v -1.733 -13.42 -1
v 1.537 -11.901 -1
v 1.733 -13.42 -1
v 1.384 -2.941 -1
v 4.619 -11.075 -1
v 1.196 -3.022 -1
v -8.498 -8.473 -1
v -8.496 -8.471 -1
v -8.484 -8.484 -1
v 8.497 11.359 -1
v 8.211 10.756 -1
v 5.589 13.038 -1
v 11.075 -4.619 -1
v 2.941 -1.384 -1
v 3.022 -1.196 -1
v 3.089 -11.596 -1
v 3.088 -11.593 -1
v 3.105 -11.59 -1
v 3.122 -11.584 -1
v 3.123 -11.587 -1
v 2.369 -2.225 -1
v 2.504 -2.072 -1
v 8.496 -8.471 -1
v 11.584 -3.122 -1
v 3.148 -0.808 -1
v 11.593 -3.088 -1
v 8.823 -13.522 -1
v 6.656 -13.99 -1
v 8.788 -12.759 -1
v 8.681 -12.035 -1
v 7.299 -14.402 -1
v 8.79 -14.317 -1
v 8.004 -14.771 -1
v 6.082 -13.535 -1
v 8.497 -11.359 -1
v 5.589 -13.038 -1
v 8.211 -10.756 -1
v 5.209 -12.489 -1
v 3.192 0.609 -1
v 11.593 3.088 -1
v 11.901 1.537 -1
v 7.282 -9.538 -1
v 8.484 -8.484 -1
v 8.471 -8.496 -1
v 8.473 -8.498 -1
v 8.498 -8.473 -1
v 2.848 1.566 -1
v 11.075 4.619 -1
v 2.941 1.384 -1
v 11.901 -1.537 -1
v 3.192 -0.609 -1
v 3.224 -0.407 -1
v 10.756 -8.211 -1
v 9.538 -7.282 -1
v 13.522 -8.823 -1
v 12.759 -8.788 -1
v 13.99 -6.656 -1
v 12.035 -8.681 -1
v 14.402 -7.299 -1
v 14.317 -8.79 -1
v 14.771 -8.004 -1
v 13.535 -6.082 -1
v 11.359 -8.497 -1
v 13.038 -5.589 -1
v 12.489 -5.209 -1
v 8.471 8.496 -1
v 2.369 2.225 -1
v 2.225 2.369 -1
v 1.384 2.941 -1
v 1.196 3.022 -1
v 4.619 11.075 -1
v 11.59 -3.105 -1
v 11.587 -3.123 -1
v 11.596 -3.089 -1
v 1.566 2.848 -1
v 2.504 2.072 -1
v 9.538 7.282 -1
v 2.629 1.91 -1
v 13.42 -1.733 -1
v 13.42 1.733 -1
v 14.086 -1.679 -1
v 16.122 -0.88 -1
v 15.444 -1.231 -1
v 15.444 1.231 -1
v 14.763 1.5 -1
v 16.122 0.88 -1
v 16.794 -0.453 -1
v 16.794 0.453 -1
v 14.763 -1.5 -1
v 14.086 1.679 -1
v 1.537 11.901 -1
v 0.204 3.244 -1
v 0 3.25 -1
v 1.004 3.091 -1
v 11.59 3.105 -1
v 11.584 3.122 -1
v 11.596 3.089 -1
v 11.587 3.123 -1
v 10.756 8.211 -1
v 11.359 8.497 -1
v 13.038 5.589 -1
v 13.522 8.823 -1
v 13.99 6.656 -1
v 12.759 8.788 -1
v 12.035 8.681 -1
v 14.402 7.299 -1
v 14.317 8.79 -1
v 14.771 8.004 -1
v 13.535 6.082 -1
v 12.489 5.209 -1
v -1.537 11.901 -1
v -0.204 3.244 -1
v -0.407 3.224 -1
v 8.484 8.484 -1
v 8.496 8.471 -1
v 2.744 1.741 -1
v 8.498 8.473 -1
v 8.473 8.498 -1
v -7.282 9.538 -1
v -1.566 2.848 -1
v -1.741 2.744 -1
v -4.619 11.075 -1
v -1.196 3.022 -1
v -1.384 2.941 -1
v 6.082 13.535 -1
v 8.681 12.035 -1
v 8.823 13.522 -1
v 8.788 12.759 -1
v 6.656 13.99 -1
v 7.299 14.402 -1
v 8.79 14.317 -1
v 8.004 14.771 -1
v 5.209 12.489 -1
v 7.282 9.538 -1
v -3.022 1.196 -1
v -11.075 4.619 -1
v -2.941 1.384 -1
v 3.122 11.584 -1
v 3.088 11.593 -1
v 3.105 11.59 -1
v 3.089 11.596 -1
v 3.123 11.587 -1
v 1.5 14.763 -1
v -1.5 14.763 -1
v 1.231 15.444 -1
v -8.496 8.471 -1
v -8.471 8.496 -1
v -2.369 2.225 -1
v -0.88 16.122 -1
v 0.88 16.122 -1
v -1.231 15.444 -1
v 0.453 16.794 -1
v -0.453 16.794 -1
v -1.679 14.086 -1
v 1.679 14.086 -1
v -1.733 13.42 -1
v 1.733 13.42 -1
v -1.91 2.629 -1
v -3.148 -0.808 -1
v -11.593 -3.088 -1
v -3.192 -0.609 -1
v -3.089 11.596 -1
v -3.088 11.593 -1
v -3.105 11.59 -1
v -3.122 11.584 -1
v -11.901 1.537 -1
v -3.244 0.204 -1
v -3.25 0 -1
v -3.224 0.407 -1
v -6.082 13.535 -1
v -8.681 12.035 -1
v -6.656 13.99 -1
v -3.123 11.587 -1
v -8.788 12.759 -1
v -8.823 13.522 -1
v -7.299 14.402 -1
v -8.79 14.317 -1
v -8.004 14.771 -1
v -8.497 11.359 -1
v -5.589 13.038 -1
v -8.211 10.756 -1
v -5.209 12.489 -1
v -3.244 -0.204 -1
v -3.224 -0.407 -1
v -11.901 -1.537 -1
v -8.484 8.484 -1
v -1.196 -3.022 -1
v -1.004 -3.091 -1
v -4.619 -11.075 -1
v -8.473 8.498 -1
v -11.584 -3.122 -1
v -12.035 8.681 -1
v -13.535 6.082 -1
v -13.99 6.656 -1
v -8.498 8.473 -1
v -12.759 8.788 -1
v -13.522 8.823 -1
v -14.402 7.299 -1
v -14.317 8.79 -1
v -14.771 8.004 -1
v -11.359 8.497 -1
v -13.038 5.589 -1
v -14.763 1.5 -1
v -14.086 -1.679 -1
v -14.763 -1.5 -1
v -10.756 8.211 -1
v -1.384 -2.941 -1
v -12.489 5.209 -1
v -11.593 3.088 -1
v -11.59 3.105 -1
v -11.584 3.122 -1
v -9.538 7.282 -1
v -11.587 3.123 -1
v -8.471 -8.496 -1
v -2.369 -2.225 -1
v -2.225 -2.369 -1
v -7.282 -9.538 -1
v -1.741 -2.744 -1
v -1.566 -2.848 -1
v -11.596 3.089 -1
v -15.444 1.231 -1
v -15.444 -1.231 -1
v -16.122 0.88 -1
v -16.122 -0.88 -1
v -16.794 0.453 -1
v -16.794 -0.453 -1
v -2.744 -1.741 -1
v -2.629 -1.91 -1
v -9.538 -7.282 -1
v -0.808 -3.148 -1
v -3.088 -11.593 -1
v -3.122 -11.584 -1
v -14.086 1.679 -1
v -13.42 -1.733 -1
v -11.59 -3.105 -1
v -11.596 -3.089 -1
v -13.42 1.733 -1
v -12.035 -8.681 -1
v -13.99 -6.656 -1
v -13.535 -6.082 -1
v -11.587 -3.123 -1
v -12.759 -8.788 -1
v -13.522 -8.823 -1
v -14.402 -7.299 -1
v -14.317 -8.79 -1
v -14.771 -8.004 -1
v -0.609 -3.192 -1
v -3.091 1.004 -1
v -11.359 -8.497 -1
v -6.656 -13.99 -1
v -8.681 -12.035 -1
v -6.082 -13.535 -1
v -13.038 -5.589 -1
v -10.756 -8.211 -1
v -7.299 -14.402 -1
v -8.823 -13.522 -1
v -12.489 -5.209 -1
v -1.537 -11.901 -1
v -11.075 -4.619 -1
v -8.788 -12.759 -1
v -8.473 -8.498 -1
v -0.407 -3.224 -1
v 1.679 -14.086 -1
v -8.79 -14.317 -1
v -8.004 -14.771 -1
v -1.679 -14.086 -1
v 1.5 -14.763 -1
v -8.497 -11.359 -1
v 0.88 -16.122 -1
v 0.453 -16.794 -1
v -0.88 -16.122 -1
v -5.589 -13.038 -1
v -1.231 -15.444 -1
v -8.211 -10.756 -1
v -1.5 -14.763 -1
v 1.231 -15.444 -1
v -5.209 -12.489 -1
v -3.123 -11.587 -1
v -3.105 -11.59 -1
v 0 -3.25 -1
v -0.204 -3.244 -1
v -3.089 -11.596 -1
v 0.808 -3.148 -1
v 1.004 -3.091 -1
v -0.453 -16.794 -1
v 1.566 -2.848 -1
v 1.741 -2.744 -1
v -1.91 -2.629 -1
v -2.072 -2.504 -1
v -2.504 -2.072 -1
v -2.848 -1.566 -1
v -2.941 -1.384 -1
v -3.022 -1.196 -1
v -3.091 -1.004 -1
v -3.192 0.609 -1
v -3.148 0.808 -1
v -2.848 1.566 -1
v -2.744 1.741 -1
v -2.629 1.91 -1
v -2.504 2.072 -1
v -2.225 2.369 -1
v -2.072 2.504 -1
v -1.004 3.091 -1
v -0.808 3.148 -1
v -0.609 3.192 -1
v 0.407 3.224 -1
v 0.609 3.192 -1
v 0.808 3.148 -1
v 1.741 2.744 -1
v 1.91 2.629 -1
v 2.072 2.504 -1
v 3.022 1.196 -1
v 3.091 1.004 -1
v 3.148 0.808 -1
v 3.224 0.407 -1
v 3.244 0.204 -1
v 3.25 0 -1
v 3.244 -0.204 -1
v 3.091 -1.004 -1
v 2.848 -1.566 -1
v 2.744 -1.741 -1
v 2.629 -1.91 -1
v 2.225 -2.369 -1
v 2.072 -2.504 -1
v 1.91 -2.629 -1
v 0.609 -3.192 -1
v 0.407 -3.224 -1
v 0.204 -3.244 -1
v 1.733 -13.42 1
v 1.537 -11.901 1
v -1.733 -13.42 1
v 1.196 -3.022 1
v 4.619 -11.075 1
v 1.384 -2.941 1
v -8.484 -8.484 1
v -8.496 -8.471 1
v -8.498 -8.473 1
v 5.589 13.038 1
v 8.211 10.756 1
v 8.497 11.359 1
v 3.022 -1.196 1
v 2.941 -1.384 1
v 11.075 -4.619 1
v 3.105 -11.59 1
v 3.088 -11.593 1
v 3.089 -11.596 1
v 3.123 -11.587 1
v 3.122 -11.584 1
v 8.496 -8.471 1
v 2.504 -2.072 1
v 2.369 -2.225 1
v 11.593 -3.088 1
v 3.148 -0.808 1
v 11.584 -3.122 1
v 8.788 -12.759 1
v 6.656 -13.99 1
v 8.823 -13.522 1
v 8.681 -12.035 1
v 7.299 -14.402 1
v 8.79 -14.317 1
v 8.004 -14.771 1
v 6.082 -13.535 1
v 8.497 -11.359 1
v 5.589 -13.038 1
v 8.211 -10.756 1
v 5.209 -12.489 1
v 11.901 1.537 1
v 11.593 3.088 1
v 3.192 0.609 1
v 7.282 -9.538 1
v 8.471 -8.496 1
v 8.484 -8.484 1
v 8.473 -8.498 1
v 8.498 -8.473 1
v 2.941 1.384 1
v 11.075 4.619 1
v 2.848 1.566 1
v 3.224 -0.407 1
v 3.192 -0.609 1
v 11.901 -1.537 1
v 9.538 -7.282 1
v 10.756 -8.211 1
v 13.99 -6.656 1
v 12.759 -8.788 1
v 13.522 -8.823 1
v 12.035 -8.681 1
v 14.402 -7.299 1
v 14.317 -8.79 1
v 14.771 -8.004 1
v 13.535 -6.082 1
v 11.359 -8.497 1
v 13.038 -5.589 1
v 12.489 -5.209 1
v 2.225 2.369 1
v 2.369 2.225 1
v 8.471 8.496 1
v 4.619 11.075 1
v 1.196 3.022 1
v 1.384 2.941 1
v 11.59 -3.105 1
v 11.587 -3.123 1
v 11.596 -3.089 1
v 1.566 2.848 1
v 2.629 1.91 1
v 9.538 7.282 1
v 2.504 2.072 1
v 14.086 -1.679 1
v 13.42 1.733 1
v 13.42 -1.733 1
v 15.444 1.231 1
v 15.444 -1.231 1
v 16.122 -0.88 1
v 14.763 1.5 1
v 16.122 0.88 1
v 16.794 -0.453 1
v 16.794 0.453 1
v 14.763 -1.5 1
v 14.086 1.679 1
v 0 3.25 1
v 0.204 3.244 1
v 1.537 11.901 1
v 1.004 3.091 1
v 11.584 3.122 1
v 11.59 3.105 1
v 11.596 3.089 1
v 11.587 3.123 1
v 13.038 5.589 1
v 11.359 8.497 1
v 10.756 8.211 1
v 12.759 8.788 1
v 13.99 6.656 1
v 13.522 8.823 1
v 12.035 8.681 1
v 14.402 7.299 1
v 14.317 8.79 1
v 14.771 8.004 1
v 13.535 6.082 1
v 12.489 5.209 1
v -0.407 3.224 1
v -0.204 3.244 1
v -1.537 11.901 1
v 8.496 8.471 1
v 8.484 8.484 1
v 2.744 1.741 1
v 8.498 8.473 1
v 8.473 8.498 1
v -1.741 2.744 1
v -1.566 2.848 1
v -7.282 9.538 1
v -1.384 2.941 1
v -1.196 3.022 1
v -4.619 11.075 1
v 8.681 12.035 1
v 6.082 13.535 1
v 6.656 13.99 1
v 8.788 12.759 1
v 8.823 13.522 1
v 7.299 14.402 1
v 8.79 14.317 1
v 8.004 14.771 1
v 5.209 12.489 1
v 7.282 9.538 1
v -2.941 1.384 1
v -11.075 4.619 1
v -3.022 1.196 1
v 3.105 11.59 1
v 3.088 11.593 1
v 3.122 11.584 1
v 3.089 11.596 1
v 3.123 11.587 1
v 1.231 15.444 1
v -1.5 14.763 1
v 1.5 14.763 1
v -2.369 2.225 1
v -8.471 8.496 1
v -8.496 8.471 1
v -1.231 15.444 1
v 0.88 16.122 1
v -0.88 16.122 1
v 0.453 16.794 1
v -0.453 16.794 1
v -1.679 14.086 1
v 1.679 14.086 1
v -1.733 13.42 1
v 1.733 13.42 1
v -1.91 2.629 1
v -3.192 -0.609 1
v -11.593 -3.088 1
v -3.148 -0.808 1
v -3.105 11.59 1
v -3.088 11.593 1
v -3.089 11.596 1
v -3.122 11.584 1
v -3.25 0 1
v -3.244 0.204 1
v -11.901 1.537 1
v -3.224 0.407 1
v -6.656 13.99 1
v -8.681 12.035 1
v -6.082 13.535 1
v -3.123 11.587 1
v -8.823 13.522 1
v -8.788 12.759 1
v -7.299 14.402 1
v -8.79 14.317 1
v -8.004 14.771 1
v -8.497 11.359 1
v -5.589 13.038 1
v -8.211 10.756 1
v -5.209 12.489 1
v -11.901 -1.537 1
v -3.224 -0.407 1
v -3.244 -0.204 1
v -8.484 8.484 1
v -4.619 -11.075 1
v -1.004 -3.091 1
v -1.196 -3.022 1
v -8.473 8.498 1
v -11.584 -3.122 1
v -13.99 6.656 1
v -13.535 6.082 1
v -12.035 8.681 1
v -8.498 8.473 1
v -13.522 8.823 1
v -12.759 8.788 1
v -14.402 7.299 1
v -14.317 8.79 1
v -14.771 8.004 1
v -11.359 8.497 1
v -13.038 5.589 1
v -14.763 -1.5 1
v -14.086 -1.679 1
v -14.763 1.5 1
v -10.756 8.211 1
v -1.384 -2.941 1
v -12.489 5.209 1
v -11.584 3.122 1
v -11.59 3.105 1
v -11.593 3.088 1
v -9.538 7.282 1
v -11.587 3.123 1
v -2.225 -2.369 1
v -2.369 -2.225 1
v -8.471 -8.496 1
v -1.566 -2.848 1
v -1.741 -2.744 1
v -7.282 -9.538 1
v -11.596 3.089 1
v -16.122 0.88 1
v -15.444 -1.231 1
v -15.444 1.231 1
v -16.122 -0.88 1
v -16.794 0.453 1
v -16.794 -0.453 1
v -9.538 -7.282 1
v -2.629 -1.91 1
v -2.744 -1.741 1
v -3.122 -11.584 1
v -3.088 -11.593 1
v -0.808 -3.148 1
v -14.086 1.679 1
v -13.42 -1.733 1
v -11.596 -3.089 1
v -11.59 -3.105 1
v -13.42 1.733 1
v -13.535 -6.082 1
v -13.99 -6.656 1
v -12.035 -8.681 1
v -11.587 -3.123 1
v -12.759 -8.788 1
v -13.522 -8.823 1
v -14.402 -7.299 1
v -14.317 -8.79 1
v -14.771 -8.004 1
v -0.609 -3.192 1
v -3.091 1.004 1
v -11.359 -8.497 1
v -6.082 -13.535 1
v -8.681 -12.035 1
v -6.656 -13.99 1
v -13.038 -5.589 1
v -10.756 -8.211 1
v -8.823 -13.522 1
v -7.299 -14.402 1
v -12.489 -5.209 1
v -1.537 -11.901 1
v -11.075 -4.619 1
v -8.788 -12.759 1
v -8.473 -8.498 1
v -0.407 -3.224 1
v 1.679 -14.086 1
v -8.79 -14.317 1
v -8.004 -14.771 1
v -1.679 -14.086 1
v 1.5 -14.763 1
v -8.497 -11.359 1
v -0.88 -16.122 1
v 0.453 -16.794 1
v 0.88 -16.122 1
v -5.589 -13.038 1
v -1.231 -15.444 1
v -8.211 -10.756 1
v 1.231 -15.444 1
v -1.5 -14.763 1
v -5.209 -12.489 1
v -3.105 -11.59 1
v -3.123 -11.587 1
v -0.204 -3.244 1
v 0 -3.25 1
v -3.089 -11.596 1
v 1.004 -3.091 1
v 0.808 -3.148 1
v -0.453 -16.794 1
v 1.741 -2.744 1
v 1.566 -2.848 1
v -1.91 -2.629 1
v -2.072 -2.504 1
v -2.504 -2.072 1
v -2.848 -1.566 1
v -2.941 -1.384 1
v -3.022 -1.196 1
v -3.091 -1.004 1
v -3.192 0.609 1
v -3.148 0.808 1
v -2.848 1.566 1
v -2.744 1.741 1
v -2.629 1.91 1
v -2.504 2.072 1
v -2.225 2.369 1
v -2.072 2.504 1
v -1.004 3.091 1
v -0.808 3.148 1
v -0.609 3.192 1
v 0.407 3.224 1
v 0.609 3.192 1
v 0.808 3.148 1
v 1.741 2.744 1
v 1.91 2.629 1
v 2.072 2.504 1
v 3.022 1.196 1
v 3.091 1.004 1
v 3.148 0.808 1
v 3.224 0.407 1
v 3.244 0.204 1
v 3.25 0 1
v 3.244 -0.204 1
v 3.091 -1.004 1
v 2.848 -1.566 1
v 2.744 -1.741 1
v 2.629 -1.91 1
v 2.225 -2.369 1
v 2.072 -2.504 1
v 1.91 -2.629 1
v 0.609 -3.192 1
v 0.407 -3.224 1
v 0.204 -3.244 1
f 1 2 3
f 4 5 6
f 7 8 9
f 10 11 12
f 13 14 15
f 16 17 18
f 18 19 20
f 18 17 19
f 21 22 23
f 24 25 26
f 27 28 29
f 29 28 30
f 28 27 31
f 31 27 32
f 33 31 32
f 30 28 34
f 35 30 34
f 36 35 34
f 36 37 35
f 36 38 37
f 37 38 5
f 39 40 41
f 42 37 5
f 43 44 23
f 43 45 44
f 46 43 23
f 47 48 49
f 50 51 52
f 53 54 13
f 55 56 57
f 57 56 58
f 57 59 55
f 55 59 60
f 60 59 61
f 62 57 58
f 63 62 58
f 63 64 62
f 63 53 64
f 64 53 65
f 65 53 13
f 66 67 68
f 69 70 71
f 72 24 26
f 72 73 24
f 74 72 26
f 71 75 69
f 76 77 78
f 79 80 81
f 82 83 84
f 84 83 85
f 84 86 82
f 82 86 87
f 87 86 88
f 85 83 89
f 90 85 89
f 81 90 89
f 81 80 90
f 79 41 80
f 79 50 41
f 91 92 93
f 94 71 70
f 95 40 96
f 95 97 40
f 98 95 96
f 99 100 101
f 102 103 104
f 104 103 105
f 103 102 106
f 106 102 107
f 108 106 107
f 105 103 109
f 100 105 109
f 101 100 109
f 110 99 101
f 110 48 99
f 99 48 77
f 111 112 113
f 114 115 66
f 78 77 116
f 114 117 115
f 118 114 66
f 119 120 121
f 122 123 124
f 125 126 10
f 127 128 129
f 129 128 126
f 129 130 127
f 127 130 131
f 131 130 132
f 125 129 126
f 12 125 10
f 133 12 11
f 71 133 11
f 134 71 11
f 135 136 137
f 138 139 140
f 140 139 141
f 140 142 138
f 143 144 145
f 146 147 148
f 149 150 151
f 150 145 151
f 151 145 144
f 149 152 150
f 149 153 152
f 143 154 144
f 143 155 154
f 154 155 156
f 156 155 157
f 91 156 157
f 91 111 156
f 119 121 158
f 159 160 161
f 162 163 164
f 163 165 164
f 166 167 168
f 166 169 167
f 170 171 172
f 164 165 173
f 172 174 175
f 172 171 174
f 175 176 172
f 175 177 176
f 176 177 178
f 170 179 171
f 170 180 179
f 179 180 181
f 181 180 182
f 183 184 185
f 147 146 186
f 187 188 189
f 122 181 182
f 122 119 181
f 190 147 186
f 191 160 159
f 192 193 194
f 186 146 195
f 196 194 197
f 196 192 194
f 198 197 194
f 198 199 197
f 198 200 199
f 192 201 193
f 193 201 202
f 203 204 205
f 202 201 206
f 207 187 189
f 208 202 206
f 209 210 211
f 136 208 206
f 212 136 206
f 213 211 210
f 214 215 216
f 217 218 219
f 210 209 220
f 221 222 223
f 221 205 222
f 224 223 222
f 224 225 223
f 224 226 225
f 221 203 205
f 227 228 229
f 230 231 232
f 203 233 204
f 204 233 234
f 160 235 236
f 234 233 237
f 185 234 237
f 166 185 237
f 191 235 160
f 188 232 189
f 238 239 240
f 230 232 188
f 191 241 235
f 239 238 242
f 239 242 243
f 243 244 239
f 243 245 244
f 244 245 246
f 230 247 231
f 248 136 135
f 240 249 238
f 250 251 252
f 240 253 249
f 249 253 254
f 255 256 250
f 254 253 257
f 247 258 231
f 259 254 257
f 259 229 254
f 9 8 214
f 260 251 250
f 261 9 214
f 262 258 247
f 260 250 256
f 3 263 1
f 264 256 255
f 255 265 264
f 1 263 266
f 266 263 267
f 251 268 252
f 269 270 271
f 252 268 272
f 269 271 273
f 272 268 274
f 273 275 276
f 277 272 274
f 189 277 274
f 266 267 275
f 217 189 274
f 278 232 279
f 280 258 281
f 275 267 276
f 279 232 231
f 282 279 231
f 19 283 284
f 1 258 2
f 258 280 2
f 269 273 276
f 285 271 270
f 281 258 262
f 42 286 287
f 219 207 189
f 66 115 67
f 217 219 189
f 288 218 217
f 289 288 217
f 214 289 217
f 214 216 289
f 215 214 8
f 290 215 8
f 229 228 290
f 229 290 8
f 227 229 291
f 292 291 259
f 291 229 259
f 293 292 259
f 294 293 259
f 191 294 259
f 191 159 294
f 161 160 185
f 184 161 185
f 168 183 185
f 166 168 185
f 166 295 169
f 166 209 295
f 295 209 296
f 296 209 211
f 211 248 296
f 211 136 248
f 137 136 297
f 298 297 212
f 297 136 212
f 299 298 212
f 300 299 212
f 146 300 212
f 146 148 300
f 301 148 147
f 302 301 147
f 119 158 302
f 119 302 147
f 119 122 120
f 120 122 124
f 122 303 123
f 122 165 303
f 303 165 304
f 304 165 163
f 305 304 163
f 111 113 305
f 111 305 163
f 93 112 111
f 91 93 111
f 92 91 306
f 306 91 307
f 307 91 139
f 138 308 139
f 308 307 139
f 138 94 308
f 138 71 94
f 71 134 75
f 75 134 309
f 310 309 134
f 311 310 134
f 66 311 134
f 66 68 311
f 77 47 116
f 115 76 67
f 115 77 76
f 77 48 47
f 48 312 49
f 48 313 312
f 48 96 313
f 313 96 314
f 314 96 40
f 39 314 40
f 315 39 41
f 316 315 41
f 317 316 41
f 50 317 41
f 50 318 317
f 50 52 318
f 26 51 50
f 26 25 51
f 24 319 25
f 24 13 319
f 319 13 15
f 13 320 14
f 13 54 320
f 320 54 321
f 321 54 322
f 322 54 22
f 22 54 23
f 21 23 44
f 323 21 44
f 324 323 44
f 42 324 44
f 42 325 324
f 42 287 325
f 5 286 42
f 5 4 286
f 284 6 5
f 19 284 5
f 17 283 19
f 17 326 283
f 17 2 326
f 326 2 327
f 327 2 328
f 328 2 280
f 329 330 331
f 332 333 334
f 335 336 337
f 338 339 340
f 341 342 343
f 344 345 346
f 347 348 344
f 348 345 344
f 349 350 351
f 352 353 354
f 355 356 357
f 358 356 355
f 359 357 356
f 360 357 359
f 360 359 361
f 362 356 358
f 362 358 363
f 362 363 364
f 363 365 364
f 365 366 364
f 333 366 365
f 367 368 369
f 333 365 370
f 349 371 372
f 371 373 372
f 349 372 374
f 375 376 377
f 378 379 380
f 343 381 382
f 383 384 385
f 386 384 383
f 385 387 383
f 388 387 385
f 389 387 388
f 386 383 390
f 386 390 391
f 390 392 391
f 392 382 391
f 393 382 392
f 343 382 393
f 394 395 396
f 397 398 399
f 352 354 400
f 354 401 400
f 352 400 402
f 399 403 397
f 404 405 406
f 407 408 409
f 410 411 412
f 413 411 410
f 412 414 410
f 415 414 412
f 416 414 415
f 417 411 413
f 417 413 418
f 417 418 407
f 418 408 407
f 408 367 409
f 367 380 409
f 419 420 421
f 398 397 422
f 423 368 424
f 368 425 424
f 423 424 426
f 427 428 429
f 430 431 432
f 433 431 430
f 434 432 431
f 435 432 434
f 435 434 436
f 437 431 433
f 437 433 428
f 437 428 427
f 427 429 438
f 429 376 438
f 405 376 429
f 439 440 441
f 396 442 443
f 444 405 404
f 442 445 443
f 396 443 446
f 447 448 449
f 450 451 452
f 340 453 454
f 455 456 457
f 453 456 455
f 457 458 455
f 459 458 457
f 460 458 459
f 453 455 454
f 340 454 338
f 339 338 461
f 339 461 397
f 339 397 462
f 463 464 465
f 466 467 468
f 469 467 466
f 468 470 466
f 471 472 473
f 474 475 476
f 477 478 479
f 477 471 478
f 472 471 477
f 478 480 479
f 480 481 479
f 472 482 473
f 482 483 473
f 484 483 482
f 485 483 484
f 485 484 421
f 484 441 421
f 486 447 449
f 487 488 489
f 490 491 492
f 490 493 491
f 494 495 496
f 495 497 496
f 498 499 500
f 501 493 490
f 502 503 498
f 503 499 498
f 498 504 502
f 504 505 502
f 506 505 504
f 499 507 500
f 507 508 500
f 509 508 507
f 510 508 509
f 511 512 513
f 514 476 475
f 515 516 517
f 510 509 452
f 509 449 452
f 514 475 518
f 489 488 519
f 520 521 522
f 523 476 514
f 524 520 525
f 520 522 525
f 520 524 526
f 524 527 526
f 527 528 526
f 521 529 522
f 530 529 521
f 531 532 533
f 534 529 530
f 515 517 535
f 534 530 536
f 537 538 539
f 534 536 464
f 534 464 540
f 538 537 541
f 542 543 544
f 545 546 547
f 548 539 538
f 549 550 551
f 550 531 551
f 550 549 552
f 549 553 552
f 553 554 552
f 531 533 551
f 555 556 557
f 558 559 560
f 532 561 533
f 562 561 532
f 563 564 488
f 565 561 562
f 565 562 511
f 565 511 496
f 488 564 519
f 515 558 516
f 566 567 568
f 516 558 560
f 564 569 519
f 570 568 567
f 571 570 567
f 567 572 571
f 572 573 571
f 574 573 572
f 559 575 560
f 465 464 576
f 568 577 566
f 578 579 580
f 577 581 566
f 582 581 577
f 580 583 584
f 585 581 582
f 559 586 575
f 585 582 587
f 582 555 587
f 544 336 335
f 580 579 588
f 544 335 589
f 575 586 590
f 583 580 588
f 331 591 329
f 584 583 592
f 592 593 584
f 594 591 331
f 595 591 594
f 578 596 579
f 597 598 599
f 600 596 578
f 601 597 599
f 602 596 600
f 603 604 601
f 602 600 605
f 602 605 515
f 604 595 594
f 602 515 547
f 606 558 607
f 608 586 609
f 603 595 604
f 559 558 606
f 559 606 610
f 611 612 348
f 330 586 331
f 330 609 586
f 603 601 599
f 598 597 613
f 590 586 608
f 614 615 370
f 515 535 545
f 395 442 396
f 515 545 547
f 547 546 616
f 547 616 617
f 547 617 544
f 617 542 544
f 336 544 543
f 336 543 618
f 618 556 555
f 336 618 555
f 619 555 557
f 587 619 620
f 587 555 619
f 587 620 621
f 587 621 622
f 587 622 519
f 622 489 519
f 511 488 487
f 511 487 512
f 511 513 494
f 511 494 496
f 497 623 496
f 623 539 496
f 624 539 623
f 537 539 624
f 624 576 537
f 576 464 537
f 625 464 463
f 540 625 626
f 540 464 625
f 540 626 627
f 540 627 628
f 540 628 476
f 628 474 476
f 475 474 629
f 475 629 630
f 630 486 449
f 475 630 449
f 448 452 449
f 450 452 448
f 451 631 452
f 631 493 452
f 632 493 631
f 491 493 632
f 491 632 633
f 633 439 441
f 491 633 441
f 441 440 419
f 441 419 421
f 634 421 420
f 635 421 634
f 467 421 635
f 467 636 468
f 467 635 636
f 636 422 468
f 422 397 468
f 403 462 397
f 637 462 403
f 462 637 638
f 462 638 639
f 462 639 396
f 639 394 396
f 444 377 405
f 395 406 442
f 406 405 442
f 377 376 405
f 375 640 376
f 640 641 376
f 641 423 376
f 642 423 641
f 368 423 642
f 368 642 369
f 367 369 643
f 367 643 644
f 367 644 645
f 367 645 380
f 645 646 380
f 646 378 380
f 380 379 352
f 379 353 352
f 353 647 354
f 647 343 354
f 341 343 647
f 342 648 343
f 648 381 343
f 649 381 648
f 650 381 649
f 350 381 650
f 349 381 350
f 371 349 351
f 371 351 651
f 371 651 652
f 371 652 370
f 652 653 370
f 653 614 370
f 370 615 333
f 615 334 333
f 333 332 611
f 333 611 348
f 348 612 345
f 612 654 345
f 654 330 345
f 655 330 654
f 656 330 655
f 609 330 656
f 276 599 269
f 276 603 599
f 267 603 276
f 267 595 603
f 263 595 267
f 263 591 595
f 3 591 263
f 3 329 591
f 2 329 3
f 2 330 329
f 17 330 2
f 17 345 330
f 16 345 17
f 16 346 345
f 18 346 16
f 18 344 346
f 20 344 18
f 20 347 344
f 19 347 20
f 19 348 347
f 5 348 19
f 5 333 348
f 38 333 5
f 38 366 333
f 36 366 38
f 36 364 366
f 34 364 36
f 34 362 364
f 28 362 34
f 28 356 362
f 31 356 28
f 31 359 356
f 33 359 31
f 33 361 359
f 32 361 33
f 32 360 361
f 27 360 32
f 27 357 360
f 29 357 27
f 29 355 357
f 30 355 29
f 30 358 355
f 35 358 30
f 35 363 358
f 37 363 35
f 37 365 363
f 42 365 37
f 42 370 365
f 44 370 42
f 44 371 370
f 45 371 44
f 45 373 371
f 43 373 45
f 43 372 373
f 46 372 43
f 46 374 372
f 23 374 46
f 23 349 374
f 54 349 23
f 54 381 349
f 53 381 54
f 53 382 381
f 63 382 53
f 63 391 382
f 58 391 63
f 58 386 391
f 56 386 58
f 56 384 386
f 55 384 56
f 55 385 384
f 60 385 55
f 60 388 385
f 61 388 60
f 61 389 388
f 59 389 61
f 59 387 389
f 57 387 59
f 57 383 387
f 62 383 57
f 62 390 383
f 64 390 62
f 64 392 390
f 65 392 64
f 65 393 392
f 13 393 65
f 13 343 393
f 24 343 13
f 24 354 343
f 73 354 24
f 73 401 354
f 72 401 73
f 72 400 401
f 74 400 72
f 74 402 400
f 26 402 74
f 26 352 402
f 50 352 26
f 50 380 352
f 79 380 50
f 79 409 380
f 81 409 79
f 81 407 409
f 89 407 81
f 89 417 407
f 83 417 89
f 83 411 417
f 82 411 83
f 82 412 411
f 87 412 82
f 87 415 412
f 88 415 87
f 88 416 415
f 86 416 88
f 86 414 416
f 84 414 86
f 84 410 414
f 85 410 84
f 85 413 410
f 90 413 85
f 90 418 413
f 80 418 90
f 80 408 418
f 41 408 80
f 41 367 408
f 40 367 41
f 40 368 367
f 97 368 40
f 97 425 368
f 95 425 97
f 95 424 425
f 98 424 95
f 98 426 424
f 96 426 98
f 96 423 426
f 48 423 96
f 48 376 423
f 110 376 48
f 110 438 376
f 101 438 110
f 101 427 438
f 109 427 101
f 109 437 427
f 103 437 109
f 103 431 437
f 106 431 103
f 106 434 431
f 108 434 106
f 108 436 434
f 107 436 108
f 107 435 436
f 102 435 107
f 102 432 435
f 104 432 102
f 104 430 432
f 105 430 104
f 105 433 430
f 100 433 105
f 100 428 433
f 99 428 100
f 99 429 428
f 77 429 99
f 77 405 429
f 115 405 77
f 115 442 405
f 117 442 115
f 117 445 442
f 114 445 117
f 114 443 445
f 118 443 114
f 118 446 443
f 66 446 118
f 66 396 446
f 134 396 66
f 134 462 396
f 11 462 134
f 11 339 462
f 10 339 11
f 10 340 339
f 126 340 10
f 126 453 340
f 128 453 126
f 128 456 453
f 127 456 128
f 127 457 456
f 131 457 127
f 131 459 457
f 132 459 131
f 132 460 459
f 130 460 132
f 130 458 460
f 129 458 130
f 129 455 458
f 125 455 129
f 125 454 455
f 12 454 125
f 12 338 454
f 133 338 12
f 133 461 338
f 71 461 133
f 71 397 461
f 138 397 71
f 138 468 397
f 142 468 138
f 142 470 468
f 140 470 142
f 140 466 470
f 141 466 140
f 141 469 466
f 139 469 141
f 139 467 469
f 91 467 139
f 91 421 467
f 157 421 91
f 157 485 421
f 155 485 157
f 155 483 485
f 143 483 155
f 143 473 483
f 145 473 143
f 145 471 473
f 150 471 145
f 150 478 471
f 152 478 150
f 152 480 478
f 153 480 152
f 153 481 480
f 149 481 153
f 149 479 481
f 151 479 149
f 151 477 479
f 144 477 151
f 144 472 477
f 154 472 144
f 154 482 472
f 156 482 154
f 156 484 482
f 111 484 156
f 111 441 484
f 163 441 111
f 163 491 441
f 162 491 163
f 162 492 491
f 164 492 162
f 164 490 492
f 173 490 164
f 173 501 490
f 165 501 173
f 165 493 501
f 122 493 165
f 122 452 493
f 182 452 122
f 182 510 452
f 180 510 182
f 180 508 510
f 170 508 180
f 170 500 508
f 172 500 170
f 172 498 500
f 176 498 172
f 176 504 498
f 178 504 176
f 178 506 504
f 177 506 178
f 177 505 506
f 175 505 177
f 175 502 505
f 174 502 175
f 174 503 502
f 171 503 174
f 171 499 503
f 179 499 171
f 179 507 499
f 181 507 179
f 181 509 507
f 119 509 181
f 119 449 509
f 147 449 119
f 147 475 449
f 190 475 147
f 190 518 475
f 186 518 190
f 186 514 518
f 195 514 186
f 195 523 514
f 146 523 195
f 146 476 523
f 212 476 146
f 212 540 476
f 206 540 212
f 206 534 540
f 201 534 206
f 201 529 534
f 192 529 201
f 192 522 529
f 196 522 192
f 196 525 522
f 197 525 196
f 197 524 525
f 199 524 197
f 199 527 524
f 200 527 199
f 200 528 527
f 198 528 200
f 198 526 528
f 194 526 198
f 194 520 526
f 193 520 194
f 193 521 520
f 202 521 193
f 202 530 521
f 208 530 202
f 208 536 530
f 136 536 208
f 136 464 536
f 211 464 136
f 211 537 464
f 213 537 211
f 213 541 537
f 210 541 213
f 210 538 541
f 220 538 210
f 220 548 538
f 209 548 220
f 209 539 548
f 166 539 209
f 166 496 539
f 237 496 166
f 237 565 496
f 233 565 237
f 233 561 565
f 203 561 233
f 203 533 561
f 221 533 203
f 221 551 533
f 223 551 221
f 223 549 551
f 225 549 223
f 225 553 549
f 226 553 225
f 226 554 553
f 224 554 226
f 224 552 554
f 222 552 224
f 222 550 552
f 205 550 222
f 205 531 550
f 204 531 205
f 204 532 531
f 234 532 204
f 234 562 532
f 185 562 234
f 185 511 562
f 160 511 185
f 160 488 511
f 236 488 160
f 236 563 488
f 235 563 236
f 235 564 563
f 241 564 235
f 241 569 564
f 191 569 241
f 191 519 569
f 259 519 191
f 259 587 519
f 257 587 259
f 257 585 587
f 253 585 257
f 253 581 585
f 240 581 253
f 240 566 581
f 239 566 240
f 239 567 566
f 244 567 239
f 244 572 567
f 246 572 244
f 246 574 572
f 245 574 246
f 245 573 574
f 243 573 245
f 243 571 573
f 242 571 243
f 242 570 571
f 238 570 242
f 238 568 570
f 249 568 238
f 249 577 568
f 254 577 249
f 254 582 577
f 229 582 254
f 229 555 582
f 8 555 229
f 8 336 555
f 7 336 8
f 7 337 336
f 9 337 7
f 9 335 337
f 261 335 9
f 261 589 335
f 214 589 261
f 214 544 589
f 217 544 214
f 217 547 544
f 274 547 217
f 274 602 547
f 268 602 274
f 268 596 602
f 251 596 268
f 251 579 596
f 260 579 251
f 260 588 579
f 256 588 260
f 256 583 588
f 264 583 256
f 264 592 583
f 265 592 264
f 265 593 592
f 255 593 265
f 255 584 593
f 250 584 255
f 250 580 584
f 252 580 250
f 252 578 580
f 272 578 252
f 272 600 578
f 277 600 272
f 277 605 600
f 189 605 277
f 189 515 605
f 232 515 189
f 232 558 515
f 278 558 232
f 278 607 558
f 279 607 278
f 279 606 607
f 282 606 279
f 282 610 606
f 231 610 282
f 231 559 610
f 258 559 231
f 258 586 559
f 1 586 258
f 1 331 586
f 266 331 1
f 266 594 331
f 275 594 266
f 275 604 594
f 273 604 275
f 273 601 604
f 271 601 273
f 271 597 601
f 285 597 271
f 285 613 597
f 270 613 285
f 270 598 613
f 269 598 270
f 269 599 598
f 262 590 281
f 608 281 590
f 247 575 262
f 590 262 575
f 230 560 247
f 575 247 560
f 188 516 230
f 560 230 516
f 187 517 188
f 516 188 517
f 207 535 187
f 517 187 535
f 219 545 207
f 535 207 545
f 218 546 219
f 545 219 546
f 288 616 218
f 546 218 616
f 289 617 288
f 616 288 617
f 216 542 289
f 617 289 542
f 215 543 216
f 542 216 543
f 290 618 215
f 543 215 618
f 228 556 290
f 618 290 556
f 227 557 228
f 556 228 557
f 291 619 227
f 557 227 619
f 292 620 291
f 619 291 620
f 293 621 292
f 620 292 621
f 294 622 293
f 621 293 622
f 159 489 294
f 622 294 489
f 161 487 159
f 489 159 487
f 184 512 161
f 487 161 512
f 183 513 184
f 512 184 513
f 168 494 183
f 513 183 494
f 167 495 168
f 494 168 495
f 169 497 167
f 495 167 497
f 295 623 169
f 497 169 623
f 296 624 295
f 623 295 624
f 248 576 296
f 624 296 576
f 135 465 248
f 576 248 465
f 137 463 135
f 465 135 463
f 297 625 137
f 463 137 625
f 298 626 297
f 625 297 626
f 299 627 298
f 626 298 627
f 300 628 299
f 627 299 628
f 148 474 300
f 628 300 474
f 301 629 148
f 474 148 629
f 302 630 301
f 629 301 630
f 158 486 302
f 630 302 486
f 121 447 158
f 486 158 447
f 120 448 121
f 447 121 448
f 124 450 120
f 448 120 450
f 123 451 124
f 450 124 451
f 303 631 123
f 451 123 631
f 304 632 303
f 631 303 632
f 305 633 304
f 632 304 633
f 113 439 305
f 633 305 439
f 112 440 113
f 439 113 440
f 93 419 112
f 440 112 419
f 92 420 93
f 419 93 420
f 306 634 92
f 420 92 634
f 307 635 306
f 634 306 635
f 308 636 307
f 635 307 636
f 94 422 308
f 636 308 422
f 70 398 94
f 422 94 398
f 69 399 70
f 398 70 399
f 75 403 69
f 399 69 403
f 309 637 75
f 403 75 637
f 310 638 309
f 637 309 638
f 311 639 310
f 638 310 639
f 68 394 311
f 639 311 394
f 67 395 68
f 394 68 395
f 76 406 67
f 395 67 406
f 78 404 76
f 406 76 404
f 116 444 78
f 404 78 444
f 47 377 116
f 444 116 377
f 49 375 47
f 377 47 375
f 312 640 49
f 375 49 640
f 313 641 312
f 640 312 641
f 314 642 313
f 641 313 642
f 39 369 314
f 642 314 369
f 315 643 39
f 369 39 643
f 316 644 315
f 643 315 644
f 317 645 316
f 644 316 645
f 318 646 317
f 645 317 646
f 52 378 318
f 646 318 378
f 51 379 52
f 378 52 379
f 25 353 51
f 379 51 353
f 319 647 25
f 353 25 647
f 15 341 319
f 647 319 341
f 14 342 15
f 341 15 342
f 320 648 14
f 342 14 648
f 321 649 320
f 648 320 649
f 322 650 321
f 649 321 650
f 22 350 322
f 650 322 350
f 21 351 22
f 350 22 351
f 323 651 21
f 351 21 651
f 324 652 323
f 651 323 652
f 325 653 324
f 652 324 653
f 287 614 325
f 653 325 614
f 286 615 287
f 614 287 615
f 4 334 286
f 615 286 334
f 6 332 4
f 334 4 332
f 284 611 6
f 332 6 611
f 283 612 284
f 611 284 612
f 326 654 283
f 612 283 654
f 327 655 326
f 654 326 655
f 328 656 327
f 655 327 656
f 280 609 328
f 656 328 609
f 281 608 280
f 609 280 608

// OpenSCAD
/**
 * Gear Module
 *
 *
 * This module generates a parametric involute spur gear with customizable pitch
 * radius, number of teeth, pressure angle, backlash, clearance, thickness, and
 * central bore diameter for fitting onto servos or motors.
 *
 * Functions:
 * - polar_to_cartesian(rad, theta): Converts polar coordinates to Cartesian.
 * - involute_angle(b, d): Calculates the involute angle for a given base and current radius.
 * - involute_point(b, s, t, d): Generates an involute curve point for gear tooth geometry.
 * - involute_point_at_fraction(f, r, b, r2, t, s): Interpolates involute point along the tooth.
 * - radius_pitch(circular_pitch, teeth_count): Calculates pitch radius.
 * - outer_radius(r_pitch, circular_pitch, clearance): Computes gear's outer radius.
 * - calc_circular_pitch(r_pitch, teeth_count): Computes circular pitch.
 * - calc_tooth_height(r_pitch, teeth_count, clearance): Computes total tooth height.
 *
 * Module:
 * gear(...)
 *   Creates a 3D involute gear with the specified parameters.
 *
 * Parameters:
 * - r_pitch          : Pitch radius of the gear.
 * - teeth_count      : Number of teeth on the gear.
 * - thickness        : Gear thickness in the Z direction.
 * - servo_dia        : Diameter of the center hole for motor shaft.
 * - teeth_to_hide    : Number of teeth to omit for partial gears.
 * - pressure_angle   : Pressure angle in degrees (typically 20-28 deg).
 * - clearance        : Radial clearance from gear root.
 * - backlash         : Amount of intentional tooth space increase.
 *
 * Example usage:
 *   gear(teeth_count=24, r_pitch=30, backlash=0.5);
 *
 * Notes:
 * - Default gear will render with 12 teeth and 14.4 mm pitch radius.
 * - You can nest modules or geometry inside gear{} to subtract their shape from the final gear.
 * - Set backlash > 0 to ensure intermeshing gears have space for proper mesh fit.
 *
 * Author: Karim Aziiev <karim.aziiev@gmail.com>
 * License: GPL-3.0-or-later
 */

/* Convert a length and polar angle to Cartesian coordinates */
function polar_to_cartesian(rad, theta) = [rad * sin(theta), rad * cos(theta)];

/**
 * Compute the involute angle (in degrees) for a given base radius (b) and
 * current radius (d).
 * The current radius (d) should be greater than or equal to b.
 *
 * Returns the involute angle in degrees.
 */

function involute_angle(b, d) =
  sqrt((d / b) * (d / b) - 1) * (180 / PI) - acos(b / d);

/* Linearly interpolate between max(b, r) and r2 using fraction f,
   and then compute the involute point at that radius.
   f = 0 corresponds to max(b, r) and f = 1 corresponds to r2.
*/
function involute_point_at_fraction(f, r, b, r2, t, s) =
  involute_point(b, s, t, (1 - f) * max(b, r) + f * r2);

/* Compute the involute point (in Cartesian coordinates) for a given base radius (b),
   scaling factor (s), angular offset (t) and the computed radius (d) along the involute.
   In other words, we first compute the involute angle and then compute the Cartesian point.
*/
function involute_point(b, s, t, d) =
  polar_to_cartesian(d, s * (involute_angle(b, d) + t));

function radius_pitch(circular_pitch, teeth_count) =
  circular_pitch * teeth_count / PI / 2;;

function outer_radius(r_pitch, circular_pitch, clearance) =
  r_pitch + circular_pitch / PI - clearance;

function calc_circular_pitch(r_pitch, teeth_count) =
  (r_pitch * 2 * PI) / teeth_count;

function calc_tooth_height(r_pitch, teeth_count, clearance) =
  2 * (calc_circular_pitch(r_pitch, teeth_count) / PI) - clearance;

module gear(r_pitch         = 14.4,
            teeth_count     = 12,
            thickness       = 2,
            servo_dia       = 6.5,
            teeth_to_hide   = 0,
            pressure_angle  = 20,
            clearance       = 0.0,
            backlash        = 0.0) {

  circular_pitch = calc_circular_pitch(r_pitch, teeth_count);

  outer_rad       = outer_radius(r_pitch, circular_pitch, clearance);
  base_circle_rad = r_pitch * cos(pressure_angle);
  root_rad        = r_pitch - (outer_rad - r_pitch) - clearance;
  tooth_thickness = circular_pitch / 2 - backlash / 2;

  inv_angle  = -involute_angle(base_circle_rad, r_pitch)
    - tooth_thickness / (2 * r_pitch) / PI * 180;

  linear_extrude(height=thickness, center=true, convexity=10) {
    difference() {
      for (i = [0:teeth_count - teeth_to_hide - 1]) {
        let (right_side = [for (f = [0 : 5])
                 involute_point_at_fraction(f / 5,
                                            root_rad,
                                            base_circle_rad,
                                            outer_rad,
                                            inv_angle,
                                            1)],
             left_side = [for (f = [5: -1: 0])
                 involute_point_at_fraction(f / 5,
                                            root_rad,
                                            base_circle_rad,
                                            outer_rad,
                                            inv_angle,
                                            -1)],
             pts =
             concat([[0, -servo_dia / 10]],
                    [polar_to_cartesian(root_rad, -181 / teeth_count)],
                    [polar_to_cartesian(root_rad,
                                        root_rad < base_circle_rad
                                        ? inv_angle
                                        : -180 / teeth_count)],
                    right_side,
                    left_side,
                    [polar_to_cartesian(root_rad,
                                        root_rad < base_circle_rad
                                        ? -inv_angle
                                        : 180 / teeth_count)],
                    [polar_to_cartesian(root_rad, 181 / teeth_count)])) {
          rotate([0, 0, i * 360 / teeth_count])
            polygon(points=pts);
        }
      }
      circle(r=servo_dia / 2, $fn = 100);
      children();
    }
  }
}

gear(backlash=1);
